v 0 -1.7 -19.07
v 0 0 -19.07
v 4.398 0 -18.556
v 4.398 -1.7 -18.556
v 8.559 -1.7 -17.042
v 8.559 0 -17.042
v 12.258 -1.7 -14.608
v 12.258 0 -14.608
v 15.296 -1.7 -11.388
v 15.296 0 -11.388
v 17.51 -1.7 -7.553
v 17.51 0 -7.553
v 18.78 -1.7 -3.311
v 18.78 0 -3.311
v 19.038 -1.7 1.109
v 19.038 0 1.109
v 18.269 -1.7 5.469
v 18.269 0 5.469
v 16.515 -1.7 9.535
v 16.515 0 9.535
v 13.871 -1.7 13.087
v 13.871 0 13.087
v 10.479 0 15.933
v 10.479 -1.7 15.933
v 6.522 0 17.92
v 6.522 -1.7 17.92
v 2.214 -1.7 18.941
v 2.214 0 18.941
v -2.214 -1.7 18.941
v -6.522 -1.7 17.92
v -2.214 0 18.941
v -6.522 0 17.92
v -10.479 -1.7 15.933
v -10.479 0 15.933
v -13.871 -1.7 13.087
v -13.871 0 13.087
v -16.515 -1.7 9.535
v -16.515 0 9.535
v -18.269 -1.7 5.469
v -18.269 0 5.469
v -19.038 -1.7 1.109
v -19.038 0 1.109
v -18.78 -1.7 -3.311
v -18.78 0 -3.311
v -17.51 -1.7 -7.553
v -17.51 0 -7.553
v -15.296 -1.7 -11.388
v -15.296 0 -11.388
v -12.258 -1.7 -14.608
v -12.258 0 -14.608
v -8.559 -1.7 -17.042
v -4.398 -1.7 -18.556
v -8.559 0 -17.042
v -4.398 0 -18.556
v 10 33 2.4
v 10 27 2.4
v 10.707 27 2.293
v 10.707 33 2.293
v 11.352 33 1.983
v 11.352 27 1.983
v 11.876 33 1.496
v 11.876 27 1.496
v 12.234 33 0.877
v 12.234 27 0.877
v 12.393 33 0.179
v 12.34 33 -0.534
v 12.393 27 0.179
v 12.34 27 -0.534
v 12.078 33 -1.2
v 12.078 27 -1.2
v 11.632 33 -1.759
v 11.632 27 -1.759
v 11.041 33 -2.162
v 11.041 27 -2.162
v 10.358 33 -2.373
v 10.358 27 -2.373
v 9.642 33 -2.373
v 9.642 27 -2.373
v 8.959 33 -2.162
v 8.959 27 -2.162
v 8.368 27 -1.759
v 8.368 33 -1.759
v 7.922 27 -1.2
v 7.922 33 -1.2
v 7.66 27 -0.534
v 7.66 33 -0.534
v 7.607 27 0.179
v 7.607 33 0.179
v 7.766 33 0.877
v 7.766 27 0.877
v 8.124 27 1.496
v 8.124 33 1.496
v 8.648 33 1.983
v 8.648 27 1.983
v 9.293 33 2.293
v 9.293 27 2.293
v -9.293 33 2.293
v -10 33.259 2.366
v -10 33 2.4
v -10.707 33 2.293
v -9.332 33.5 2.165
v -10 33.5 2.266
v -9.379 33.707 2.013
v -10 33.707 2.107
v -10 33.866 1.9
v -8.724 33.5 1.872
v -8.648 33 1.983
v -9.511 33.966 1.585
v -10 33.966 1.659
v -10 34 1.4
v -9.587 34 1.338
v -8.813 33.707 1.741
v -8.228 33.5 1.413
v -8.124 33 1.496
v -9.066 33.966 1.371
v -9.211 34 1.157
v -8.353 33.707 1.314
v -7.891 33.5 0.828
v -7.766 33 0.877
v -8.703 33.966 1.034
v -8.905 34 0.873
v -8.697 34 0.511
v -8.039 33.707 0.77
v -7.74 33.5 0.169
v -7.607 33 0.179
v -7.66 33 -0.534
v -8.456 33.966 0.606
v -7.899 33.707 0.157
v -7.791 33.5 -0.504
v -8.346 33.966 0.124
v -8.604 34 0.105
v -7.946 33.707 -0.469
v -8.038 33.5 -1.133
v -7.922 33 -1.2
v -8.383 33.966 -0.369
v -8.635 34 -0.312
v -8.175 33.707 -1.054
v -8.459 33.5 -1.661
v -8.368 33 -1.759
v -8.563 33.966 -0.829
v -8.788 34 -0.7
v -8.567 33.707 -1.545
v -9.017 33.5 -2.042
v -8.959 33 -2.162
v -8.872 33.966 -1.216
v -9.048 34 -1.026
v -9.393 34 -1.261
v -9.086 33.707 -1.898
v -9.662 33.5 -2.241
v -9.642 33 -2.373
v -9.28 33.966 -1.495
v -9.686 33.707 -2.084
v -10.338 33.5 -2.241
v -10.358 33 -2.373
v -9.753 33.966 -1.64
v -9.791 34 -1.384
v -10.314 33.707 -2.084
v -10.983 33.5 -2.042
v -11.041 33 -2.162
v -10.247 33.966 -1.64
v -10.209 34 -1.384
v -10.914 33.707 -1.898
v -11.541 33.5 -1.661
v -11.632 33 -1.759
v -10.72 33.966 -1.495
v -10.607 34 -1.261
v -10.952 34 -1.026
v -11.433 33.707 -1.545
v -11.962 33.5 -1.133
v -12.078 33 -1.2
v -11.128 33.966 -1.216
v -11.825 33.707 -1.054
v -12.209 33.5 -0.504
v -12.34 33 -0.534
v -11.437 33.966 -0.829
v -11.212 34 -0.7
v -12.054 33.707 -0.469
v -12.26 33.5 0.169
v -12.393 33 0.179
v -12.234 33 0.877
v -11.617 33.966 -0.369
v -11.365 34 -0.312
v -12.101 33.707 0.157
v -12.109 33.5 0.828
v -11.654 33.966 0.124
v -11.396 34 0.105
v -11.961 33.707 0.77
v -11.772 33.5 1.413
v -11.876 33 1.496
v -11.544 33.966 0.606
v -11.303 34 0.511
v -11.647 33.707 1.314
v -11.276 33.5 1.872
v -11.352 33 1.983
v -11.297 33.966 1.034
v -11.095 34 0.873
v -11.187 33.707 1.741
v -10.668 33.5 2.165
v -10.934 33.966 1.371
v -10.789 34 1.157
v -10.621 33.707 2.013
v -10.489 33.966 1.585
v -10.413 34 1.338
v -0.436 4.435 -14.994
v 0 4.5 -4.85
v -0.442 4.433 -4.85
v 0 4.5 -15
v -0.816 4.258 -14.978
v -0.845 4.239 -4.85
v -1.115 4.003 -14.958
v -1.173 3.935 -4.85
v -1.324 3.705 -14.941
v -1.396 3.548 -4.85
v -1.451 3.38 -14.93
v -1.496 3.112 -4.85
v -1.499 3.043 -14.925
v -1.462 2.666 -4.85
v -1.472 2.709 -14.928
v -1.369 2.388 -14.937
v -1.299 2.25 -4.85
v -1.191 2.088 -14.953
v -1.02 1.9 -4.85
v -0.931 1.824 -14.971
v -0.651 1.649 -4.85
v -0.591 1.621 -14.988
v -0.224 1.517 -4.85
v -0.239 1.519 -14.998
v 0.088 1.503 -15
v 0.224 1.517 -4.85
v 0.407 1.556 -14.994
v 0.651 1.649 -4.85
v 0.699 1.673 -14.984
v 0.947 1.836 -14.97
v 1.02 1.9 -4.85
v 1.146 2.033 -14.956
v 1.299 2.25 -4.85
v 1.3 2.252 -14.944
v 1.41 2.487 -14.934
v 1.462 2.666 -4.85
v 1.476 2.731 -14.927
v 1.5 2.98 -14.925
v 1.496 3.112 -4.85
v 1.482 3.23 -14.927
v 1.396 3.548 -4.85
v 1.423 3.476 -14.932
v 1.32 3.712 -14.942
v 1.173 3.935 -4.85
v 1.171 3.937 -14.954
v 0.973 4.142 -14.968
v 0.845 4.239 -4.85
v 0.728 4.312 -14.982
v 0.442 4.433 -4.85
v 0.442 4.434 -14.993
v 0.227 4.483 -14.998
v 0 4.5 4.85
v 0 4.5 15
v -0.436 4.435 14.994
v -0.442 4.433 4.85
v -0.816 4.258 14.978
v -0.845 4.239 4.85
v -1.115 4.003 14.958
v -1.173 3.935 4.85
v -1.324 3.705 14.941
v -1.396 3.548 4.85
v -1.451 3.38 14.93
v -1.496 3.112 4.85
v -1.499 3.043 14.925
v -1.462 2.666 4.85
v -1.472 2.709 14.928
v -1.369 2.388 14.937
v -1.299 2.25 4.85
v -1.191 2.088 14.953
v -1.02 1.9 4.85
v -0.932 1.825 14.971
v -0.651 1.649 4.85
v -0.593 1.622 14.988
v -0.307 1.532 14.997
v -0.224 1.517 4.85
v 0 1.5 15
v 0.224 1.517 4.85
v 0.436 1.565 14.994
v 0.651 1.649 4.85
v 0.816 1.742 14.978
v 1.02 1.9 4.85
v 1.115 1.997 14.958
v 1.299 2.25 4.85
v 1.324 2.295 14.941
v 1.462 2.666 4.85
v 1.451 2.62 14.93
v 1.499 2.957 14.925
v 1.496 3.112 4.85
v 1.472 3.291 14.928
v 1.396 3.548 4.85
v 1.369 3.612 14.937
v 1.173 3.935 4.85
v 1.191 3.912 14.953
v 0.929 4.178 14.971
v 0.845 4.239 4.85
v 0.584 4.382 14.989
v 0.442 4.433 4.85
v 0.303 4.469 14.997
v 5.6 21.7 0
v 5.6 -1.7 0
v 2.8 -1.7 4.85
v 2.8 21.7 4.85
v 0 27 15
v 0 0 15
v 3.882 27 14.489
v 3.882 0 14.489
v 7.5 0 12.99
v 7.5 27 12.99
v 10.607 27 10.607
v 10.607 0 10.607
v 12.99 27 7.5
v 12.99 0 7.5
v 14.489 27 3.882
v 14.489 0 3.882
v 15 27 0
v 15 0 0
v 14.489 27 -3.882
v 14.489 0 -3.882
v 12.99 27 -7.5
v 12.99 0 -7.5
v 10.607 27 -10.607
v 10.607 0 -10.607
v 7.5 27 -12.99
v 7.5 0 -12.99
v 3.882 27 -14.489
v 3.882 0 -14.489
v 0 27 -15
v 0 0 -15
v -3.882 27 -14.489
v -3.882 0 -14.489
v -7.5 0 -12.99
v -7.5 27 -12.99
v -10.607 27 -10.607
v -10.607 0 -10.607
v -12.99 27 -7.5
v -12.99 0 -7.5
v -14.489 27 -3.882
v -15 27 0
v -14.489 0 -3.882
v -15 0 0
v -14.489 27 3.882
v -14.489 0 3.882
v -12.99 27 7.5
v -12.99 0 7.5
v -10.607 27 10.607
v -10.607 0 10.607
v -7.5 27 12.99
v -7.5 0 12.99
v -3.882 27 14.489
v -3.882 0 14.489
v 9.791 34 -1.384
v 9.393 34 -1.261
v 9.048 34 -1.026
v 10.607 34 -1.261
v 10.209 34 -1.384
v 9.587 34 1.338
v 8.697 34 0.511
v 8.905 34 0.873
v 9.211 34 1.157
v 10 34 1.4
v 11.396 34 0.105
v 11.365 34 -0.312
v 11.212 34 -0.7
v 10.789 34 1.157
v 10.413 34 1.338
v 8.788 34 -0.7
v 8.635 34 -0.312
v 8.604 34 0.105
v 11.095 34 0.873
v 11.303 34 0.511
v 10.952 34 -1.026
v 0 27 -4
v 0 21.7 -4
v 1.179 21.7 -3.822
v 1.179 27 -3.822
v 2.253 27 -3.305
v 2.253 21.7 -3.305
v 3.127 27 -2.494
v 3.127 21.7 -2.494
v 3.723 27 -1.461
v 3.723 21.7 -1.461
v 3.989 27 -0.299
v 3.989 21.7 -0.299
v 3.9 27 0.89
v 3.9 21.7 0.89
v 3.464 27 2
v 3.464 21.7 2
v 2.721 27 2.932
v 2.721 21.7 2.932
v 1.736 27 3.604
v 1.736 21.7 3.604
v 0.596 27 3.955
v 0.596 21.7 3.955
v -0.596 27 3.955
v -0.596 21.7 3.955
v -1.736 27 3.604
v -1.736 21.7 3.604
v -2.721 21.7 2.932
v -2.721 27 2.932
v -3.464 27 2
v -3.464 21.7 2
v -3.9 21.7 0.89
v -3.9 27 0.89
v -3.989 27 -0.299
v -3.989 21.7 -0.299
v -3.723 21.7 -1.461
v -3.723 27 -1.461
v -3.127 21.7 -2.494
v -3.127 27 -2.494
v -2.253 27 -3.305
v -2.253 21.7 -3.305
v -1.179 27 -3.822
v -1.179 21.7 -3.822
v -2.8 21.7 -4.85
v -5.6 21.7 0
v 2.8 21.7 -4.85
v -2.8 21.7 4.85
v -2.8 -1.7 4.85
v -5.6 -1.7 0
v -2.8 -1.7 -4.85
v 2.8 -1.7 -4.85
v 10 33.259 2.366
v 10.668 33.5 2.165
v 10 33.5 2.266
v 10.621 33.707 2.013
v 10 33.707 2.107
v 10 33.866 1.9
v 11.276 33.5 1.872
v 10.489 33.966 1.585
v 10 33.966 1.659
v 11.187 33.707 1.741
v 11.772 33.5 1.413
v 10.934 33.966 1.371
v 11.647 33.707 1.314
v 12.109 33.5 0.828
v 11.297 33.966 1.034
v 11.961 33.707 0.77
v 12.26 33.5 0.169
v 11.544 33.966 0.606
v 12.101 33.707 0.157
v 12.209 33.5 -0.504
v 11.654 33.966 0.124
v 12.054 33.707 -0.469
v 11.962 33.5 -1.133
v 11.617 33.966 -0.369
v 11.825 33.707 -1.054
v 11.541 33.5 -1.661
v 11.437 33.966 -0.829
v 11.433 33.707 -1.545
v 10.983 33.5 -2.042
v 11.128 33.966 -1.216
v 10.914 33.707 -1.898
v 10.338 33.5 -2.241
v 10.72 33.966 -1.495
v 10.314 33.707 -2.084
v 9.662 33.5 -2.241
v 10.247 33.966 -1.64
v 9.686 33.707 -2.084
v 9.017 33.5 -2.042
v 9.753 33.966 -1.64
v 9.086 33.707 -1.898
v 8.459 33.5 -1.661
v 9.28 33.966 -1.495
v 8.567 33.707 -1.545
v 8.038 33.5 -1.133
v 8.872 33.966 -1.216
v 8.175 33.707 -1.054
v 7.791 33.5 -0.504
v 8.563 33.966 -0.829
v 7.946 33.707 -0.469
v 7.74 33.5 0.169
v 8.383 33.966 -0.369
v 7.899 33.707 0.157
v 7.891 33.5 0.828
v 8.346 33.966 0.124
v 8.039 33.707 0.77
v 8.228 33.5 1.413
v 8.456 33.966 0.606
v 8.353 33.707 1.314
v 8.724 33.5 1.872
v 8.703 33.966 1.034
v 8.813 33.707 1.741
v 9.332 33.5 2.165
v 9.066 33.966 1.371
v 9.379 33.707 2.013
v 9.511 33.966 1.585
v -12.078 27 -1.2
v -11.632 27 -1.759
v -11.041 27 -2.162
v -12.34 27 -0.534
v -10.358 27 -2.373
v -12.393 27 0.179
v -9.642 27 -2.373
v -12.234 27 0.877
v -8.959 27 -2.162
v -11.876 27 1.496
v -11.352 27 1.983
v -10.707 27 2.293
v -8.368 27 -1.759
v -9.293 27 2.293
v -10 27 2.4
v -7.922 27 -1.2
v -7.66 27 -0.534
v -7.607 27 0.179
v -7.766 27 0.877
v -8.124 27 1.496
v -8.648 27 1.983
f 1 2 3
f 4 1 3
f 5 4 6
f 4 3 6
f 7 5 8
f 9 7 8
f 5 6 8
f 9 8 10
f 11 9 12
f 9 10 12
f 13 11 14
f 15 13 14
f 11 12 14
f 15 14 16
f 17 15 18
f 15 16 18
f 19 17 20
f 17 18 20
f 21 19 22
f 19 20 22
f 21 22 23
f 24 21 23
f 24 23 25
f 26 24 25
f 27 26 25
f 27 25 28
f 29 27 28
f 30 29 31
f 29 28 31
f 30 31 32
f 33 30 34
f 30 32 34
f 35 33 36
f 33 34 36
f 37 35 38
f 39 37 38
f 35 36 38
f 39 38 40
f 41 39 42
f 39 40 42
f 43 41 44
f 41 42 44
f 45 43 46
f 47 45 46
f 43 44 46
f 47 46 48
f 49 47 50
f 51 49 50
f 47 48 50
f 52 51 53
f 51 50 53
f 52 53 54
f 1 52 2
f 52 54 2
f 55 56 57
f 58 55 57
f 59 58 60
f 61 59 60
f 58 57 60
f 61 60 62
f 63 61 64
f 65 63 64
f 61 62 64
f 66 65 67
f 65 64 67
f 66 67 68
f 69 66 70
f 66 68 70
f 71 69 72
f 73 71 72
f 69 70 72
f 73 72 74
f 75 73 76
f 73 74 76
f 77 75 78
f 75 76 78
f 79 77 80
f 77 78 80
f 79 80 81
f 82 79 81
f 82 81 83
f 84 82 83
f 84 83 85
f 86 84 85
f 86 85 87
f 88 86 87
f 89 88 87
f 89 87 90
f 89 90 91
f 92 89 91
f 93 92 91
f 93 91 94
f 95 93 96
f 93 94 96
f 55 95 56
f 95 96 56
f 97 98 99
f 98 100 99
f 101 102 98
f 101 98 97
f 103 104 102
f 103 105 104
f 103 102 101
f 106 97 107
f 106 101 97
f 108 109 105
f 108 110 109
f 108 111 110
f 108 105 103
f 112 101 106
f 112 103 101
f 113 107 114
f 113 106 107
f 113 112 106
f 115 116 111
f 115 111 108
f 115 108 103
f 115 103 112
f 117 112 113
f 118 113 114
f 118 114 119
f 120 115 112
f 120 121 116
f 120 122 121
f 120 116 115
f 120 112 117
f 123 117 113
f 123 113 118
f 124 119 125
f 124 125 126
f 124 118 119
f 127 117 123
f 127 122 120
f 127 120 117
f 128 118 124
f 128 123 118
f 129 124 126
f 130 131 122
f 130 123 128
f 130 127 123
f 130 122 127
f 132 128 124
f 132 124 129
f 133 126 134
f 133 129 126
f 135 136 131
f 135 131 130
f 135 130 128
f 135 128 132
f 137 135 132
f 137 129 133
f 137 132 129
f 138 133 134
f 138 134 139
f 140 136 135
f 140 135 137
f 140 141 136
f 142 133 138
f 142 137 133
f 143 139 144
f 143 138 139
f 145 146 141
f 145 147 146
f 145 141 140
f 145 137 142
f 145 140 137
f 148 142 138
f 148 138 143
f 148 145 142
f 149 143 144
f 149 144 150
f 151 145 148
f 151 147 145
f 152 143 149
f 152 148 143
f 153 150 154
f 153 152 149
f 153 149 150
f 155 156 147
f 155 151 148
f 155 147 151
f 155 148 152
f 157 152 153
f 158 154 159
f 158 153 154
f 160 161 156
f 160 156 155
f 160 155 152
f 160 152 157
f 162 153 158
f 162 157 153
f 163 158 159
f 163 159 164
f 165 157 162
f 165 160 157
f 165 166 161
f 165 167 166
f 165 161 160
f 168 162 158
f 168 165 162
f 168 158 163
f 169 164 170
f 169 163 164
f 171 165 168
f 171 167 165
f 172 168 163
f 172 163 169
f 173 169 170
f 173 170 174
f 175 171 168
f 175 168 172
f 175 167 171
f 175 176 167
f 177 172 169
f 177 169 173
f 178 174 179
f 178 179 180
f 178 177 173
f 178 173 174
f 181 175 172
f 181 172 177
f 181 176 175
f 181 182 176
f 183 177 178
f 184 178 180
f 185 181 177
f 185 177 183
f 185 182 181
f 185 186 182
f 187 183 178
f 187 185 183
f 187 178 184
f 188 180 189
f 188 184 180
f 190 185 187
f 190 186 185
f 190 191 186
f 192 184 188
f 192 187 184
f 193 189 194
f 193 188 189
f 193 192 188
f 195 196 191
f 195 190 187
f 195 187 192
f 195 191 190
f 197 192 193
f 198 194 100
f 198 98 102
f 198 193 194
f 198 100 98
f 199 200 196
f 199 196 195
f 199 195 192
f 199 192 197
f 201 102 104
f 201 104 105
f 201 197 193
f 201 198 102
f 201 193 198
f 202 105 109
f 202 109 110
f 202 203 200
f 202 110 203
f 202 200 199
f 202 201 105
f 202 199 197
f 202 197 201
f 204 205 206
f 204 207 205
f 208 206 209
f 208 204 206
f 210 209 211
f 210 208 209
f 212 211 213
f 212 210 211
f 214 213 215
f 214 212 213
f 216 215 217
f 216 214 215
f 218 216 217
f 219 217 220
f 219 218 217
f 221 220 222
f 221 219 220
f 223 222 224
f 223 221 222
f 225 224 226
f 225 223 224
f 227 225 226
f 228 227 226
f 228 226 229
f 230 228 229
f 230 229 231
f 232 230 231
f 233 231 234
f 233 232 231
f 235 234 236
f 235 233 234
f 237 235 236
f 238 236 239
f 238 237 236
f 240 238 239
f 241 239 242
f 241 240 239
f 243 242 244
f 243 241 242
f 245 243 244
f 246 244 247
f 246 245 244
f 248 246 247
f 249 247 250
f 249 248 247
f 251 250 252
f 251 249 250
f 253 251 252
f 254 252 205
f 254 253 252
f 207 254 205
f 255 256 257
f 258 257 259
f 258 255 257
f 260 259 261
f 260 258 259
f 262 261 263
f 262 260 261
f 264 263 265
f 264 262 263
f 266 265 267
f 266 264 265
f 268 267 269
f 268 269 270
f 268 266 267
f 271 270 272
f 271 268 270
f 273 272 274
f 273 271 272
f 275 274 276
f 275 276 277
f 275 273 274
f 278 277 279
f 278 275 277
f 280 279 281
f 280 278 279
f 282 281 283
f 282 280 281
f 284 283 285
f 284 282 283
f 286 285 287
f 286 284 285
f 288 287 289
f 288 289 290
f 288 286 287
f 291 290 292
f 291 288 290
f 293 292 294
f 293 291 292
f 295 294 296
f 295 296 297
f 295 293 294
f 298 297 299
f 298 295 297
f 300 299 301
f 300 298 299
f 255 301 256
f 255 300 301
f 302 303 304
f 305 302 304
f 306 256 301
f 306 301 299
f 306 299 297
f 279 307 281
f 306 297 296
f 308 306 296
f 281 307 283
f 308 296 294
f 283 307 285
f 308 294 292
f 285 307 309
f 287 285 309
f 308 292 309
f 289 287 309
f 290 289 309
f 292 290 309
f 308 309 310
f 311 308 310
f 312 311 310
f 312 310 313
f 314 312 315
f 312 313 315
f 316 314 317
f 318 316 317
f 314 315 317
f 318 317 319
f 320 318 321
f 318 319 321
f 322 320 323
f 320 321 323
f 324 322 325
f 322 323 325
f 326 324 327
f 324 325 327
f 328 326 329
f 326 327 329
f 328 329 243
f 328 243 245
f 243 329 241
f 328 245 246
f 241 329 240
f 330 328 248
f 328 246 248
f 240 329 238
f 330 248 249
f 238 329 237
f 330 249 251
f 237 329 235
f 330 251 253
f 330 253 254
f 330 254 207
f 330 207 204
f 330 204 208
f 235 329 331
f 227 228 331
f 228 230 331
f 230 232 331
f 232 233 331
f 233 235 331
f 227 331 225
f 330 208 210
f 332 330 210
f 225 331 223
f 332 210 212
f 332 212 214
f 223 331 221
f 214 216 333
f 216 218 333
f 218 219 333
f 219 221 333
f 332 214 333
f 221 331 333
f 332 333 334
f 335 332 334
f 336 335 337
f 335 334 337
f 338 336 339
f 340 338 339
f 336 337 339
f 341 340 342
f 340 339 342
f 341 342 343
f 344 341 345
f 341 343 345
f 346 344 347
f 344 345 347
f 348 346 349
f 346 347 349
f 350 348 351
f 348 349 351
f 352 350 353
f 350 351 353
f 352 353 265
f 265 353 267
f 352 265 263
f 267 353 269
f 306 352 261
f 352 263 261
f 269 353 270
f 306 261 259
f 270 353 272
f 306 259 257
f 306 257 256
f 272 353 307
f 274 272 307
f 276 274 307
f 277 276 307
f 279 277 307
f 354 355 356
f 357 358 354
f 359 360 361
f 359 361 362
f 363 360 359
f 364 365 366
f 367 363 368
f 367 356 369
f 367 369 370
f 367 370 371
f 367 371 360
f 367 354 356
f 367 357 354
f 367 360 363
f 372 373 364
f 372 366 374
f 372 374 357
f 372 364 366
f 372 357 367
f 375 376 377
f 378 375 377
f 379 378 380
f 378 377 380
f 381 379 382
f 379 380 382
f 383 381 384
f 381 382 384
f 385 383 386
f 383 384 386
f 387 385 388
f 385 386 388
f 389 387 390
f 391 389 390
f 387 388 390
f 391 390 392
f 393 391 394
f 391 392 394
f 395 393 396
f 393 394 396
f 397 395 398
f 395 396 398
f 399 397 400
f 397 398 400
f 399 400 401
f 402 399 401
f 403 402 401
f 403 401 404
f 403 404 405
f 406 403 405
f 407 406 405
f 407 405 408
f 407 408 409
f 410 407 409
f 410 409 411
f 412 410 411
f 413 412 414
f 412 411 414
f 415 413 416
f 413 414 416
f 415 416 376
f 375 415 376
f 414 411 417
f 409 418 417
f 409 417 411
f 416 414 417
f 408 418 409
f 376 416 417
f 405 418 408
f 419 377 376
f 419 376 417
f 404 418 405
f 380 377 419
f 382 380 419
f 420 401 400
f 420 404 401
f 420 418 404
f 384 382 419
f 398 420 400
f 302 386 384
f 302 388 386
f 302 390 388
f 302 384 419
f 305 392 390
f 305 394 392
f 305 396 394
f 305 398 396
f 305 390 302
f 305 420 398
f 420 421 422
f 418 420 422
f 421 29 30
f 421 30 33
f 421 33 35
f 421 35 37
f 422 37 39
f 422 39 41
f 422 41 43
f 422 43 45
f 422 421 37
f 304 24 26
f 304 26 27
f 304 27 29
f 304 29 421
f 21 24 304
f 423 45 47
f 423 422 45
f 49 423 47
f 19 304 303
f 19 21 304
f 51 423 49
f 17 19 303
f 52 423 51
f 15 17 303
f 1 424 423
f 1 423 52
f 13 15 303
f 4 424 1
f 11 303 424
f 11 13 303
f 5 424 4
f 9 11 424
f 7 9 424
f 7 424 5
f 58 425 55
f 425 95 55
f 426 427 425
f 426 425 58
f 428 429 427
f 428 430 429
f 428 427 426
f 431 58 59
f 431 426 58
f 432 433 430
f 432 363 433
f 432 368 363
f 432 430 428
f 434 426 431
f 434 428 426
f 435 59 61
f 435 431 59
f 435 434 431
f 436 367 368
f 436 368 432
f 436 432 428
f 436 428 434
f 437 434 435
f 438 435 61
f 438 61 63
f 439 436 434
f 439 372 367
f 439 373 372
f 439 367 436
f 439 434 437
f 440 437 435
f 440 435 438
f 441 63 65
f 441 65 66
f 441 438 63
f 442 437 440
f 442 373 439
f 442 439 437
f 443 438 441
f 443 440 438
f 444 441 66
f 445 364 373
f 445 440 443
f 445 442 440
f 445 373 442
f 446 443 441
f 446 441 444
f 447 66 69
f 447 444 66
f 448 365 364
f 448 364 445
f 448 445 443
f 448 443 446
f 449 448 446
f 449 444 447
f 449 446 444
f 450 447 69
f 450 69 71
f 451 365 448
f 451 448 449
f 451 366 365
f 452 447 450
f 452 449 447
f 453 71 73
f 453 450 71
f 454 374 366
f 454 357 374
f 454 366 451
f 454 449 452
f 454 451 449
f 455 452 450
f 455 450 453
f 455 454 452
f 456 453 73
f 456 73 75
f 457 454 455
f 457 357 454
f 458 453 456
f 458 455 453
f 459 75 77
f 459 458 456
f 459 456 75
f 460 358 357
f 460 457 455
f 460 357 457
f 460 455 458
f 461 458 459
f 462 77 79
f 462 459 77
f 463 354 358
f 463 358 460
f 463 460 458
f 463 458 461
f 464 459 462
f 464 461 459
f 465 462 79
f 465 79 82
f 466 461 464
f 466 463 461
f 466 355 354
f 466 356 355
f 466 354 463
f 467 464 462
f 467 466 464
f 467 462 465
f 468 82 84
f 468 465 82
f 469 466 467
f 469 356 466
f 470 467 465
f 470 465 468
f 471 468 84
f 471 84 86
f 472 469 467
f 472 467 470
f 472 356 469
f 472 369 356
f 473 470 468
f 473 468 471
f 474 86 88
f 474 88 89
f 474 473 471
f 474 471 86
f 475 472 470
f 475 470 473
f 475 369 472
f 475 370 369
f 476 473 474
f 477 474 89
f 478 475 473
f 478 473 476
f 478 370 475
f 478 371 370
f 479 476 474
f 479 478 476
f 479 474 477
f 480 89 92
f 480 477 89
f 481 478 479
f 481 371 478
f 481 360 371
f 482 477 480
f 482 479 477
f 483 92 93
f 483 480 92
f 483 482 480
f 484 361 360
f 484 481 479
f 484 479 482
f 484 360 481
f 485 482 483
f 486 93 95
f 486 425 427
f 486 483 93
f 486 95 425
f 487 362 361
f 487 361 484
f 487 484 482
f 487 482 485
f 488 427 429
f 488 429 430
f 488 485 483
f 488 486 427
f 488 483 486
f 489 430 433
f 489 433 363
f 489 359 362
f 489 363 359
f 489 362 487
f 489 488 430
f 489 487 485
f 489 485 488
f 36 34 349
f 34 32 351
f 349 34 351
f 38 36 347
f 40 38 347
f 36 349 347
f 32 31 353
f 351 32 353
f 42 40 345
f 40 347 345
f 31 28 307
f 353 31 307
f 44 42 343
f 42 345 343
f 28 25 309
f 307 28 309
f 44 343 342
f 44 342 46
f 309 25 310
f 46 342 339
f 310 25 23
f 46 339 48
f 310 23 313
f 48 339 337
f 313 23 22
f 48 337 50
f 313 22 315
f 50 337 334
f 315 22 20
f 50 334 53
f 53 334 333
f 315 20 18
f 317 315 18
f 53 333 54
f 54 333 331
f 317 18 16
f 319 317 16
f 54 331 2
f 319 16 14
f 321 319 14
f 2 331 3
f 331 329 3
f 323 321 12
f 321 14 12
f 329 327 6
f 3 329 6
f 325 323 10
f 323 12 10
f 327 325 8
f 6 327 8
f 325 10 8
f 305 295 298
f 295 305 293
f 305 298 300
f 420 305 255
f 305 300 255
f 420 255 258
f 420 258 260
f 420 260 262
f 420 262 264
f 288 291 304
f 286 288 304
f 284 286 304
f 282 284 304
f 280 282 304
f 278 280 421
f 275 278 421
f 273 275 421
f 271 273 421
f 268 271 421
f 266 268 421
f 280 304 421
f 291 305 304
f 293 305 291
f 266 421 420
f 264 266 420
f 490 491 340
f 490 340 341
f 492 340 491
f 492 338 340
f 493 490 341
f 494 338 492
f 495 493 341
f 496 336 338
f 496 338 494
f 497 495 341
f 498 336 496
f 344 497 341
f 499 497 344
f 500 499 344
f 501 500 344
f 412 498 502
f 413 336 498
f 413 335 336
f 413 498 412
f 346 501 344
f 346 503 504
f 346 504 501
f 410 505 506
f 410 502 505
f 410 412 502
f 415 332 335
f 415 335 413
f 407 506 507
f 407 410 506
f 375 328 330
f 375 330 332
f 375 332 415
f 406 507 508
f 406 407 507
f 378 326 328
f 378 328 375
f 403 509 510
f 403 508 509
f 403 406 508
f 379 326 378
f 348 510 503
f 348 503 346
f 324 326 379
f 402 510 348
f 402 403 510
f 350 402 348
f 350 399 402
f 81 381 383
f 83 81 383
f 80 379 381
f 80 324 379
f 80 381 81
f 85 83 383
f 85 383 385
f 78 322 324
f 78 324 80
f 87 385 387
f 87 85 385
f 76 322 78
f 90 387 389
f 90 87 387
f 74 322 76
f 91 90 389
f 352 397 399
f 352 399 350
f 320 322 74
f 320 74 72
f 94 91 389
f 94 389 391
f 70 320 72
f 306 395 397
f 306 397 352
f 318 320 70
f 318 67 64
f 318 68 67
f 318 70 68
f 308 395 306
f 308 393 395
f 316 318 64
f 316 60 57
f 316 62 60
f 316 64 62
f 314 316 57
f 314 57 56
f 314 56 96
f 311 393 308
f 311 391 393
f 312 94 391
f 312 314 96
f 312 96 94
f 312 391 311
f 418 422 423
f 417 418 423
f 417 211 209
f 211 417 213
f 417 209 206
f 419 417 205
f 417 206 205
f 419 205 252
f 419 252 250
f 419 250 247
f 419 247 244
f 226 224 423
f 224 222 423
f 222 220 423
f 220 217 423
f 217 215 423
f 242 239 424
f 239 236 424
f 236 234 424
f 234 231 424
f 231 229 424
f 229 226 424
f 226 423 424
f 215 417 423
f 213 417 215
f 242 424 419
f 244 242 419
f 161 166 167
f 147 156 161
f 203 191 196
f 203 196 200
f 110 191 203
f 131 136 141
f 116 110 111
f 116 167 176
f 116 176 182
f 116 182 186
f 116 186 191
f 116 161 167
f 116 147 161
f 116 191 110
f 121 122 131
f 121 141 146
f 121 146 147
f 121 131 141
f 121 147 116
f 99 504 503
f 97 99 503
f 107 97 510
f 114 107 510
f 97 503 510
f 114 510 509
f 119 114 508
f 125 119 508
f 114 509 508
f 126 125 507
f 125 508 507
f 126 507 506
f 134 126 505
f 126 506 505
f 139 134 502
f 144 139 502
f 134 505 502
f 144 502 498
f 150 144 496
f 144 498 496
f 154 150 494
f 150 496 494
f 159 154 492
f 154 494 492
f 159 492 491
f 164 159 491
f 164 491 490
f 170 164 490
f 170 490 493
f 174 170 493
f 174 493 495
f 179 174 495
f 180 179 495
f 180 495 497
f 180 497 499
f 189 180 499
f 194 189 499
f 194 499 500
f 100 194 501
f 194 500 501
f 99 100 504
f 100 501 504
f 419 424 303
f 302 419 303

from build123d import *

# Parameters (mm, degrees)
SKETCH1_R               = 15
BOSS_EXTRUDE1_DEPTH     = 27
SKETCH2_R               = 19.07
BOSS_EXTRUDE2_DEPTH     = 1.7
CUT_EXTRUDE1_DEPTH      = 23.4
SKETCH4_R               = 4
CUT_EXTRUDE2_DEPTH      = 5.3
SKETCH5_R               = 2.4
BOSS_EXTRUDE3_DEPTH     = 7
FILLET1_R               = 1
CUT_EXTRUDE3_DEPTH      = 44.397347845
CUT_EXTRUDE3_DEPTH_BACK = 44.397347845
SKETCH6_R               = 1.5


with BuildPart() as part:
    # Sketch1 → Boss-Extrude1 (new body)
    with BuildSketch(Plane(origin=(0, 0, 0), x_dir=(1, 0, 0), z_dir=(0, 1, 0))):
        with Locations(Location((0, 0, 0), (0, 0, 270))):
            Circle(SKETCH1_R)
    extrude(amount=BOSS_EXTRUDE1_DEPTH)

    # Sketch2 → Boss-Extrude2 (add)
    with BuildSketch(Plane.XZ):
        with Locations(Location((0, 0, 0), (0, 0, 270))):
            Circle(SKETCH2_R)
    extrude(amount=BOSS_EXTRUDE2_DEPTH)

    # Sketch3 → Cut-Extrude1 (cut)
    with BuildSketch(Plane.XZ.offset(1.7)):
        Polygon((-2.800148806, 4.85), (-5.600297611, 0), (-2.800148806, -4.85), (2.800148806, -4.85), (5.600297611, 0), (2.800148806, 4.85), align=None)
    extrude(amount=-CUT_EXTRUDE1_DEPTH, mode=Mode.SUBTRACT)

    # Sketch4 → Cut-Extrude2 (cut)
    with BuildSketch(Plane.XZ.offset(-21.7)):
        with Locations(Location((0, 0, 0), (0, 0, 270))):
            Circle(SKETCH4_R)
    extrude(amount=-CUT_EXTRUDE2_DEPTH, mode=Mode.SUBTRACT)

    # Sketch5 → Boss-Extrude3 (add)
    with BuildSketch(Plane(origin=(0, 27, 0), x_dir=(1, 0, 0), z_dir=(0, 1, 0))):
        with Locations(Location((-10, 0, 0), (0, 0, 270))):
            Circle(SKETCH5_R)
        with Locations(Location((10, 0, 0), (0, 0, 270))):
            Circle(SKETCH5_R)
    extrude(amount=BOSS_EXTRUDE3_DEPTH)

    # Fillet1
    fillet1_edges = [part.edges().sort_by_distance(p)[0] for p in [
        (-10, 34, -2.4),
        (10, 34, -2.4),
    ]]
    fillet(fillet1_edges, radius=FILLET1_R)

    # Sketch6 → Cut-Extrude3 (cut, two sides: drawn at the far end of the back side and taken through both)
    with BuildSketch(Plane.XY.offset(-CUT_EXTRUDE3_DEPTH_BACK)):
        with Locations(Location((0, 3, 0), (0, 0, 90))):
            Circle(SKETCH6_R)
    extrude(amount=CUT_EXTRUDE3_DEPTH + CUT_EXTRUDE3_DEPTH_BACK, mode=Mode.SUBTRACT)


solid = part.part
